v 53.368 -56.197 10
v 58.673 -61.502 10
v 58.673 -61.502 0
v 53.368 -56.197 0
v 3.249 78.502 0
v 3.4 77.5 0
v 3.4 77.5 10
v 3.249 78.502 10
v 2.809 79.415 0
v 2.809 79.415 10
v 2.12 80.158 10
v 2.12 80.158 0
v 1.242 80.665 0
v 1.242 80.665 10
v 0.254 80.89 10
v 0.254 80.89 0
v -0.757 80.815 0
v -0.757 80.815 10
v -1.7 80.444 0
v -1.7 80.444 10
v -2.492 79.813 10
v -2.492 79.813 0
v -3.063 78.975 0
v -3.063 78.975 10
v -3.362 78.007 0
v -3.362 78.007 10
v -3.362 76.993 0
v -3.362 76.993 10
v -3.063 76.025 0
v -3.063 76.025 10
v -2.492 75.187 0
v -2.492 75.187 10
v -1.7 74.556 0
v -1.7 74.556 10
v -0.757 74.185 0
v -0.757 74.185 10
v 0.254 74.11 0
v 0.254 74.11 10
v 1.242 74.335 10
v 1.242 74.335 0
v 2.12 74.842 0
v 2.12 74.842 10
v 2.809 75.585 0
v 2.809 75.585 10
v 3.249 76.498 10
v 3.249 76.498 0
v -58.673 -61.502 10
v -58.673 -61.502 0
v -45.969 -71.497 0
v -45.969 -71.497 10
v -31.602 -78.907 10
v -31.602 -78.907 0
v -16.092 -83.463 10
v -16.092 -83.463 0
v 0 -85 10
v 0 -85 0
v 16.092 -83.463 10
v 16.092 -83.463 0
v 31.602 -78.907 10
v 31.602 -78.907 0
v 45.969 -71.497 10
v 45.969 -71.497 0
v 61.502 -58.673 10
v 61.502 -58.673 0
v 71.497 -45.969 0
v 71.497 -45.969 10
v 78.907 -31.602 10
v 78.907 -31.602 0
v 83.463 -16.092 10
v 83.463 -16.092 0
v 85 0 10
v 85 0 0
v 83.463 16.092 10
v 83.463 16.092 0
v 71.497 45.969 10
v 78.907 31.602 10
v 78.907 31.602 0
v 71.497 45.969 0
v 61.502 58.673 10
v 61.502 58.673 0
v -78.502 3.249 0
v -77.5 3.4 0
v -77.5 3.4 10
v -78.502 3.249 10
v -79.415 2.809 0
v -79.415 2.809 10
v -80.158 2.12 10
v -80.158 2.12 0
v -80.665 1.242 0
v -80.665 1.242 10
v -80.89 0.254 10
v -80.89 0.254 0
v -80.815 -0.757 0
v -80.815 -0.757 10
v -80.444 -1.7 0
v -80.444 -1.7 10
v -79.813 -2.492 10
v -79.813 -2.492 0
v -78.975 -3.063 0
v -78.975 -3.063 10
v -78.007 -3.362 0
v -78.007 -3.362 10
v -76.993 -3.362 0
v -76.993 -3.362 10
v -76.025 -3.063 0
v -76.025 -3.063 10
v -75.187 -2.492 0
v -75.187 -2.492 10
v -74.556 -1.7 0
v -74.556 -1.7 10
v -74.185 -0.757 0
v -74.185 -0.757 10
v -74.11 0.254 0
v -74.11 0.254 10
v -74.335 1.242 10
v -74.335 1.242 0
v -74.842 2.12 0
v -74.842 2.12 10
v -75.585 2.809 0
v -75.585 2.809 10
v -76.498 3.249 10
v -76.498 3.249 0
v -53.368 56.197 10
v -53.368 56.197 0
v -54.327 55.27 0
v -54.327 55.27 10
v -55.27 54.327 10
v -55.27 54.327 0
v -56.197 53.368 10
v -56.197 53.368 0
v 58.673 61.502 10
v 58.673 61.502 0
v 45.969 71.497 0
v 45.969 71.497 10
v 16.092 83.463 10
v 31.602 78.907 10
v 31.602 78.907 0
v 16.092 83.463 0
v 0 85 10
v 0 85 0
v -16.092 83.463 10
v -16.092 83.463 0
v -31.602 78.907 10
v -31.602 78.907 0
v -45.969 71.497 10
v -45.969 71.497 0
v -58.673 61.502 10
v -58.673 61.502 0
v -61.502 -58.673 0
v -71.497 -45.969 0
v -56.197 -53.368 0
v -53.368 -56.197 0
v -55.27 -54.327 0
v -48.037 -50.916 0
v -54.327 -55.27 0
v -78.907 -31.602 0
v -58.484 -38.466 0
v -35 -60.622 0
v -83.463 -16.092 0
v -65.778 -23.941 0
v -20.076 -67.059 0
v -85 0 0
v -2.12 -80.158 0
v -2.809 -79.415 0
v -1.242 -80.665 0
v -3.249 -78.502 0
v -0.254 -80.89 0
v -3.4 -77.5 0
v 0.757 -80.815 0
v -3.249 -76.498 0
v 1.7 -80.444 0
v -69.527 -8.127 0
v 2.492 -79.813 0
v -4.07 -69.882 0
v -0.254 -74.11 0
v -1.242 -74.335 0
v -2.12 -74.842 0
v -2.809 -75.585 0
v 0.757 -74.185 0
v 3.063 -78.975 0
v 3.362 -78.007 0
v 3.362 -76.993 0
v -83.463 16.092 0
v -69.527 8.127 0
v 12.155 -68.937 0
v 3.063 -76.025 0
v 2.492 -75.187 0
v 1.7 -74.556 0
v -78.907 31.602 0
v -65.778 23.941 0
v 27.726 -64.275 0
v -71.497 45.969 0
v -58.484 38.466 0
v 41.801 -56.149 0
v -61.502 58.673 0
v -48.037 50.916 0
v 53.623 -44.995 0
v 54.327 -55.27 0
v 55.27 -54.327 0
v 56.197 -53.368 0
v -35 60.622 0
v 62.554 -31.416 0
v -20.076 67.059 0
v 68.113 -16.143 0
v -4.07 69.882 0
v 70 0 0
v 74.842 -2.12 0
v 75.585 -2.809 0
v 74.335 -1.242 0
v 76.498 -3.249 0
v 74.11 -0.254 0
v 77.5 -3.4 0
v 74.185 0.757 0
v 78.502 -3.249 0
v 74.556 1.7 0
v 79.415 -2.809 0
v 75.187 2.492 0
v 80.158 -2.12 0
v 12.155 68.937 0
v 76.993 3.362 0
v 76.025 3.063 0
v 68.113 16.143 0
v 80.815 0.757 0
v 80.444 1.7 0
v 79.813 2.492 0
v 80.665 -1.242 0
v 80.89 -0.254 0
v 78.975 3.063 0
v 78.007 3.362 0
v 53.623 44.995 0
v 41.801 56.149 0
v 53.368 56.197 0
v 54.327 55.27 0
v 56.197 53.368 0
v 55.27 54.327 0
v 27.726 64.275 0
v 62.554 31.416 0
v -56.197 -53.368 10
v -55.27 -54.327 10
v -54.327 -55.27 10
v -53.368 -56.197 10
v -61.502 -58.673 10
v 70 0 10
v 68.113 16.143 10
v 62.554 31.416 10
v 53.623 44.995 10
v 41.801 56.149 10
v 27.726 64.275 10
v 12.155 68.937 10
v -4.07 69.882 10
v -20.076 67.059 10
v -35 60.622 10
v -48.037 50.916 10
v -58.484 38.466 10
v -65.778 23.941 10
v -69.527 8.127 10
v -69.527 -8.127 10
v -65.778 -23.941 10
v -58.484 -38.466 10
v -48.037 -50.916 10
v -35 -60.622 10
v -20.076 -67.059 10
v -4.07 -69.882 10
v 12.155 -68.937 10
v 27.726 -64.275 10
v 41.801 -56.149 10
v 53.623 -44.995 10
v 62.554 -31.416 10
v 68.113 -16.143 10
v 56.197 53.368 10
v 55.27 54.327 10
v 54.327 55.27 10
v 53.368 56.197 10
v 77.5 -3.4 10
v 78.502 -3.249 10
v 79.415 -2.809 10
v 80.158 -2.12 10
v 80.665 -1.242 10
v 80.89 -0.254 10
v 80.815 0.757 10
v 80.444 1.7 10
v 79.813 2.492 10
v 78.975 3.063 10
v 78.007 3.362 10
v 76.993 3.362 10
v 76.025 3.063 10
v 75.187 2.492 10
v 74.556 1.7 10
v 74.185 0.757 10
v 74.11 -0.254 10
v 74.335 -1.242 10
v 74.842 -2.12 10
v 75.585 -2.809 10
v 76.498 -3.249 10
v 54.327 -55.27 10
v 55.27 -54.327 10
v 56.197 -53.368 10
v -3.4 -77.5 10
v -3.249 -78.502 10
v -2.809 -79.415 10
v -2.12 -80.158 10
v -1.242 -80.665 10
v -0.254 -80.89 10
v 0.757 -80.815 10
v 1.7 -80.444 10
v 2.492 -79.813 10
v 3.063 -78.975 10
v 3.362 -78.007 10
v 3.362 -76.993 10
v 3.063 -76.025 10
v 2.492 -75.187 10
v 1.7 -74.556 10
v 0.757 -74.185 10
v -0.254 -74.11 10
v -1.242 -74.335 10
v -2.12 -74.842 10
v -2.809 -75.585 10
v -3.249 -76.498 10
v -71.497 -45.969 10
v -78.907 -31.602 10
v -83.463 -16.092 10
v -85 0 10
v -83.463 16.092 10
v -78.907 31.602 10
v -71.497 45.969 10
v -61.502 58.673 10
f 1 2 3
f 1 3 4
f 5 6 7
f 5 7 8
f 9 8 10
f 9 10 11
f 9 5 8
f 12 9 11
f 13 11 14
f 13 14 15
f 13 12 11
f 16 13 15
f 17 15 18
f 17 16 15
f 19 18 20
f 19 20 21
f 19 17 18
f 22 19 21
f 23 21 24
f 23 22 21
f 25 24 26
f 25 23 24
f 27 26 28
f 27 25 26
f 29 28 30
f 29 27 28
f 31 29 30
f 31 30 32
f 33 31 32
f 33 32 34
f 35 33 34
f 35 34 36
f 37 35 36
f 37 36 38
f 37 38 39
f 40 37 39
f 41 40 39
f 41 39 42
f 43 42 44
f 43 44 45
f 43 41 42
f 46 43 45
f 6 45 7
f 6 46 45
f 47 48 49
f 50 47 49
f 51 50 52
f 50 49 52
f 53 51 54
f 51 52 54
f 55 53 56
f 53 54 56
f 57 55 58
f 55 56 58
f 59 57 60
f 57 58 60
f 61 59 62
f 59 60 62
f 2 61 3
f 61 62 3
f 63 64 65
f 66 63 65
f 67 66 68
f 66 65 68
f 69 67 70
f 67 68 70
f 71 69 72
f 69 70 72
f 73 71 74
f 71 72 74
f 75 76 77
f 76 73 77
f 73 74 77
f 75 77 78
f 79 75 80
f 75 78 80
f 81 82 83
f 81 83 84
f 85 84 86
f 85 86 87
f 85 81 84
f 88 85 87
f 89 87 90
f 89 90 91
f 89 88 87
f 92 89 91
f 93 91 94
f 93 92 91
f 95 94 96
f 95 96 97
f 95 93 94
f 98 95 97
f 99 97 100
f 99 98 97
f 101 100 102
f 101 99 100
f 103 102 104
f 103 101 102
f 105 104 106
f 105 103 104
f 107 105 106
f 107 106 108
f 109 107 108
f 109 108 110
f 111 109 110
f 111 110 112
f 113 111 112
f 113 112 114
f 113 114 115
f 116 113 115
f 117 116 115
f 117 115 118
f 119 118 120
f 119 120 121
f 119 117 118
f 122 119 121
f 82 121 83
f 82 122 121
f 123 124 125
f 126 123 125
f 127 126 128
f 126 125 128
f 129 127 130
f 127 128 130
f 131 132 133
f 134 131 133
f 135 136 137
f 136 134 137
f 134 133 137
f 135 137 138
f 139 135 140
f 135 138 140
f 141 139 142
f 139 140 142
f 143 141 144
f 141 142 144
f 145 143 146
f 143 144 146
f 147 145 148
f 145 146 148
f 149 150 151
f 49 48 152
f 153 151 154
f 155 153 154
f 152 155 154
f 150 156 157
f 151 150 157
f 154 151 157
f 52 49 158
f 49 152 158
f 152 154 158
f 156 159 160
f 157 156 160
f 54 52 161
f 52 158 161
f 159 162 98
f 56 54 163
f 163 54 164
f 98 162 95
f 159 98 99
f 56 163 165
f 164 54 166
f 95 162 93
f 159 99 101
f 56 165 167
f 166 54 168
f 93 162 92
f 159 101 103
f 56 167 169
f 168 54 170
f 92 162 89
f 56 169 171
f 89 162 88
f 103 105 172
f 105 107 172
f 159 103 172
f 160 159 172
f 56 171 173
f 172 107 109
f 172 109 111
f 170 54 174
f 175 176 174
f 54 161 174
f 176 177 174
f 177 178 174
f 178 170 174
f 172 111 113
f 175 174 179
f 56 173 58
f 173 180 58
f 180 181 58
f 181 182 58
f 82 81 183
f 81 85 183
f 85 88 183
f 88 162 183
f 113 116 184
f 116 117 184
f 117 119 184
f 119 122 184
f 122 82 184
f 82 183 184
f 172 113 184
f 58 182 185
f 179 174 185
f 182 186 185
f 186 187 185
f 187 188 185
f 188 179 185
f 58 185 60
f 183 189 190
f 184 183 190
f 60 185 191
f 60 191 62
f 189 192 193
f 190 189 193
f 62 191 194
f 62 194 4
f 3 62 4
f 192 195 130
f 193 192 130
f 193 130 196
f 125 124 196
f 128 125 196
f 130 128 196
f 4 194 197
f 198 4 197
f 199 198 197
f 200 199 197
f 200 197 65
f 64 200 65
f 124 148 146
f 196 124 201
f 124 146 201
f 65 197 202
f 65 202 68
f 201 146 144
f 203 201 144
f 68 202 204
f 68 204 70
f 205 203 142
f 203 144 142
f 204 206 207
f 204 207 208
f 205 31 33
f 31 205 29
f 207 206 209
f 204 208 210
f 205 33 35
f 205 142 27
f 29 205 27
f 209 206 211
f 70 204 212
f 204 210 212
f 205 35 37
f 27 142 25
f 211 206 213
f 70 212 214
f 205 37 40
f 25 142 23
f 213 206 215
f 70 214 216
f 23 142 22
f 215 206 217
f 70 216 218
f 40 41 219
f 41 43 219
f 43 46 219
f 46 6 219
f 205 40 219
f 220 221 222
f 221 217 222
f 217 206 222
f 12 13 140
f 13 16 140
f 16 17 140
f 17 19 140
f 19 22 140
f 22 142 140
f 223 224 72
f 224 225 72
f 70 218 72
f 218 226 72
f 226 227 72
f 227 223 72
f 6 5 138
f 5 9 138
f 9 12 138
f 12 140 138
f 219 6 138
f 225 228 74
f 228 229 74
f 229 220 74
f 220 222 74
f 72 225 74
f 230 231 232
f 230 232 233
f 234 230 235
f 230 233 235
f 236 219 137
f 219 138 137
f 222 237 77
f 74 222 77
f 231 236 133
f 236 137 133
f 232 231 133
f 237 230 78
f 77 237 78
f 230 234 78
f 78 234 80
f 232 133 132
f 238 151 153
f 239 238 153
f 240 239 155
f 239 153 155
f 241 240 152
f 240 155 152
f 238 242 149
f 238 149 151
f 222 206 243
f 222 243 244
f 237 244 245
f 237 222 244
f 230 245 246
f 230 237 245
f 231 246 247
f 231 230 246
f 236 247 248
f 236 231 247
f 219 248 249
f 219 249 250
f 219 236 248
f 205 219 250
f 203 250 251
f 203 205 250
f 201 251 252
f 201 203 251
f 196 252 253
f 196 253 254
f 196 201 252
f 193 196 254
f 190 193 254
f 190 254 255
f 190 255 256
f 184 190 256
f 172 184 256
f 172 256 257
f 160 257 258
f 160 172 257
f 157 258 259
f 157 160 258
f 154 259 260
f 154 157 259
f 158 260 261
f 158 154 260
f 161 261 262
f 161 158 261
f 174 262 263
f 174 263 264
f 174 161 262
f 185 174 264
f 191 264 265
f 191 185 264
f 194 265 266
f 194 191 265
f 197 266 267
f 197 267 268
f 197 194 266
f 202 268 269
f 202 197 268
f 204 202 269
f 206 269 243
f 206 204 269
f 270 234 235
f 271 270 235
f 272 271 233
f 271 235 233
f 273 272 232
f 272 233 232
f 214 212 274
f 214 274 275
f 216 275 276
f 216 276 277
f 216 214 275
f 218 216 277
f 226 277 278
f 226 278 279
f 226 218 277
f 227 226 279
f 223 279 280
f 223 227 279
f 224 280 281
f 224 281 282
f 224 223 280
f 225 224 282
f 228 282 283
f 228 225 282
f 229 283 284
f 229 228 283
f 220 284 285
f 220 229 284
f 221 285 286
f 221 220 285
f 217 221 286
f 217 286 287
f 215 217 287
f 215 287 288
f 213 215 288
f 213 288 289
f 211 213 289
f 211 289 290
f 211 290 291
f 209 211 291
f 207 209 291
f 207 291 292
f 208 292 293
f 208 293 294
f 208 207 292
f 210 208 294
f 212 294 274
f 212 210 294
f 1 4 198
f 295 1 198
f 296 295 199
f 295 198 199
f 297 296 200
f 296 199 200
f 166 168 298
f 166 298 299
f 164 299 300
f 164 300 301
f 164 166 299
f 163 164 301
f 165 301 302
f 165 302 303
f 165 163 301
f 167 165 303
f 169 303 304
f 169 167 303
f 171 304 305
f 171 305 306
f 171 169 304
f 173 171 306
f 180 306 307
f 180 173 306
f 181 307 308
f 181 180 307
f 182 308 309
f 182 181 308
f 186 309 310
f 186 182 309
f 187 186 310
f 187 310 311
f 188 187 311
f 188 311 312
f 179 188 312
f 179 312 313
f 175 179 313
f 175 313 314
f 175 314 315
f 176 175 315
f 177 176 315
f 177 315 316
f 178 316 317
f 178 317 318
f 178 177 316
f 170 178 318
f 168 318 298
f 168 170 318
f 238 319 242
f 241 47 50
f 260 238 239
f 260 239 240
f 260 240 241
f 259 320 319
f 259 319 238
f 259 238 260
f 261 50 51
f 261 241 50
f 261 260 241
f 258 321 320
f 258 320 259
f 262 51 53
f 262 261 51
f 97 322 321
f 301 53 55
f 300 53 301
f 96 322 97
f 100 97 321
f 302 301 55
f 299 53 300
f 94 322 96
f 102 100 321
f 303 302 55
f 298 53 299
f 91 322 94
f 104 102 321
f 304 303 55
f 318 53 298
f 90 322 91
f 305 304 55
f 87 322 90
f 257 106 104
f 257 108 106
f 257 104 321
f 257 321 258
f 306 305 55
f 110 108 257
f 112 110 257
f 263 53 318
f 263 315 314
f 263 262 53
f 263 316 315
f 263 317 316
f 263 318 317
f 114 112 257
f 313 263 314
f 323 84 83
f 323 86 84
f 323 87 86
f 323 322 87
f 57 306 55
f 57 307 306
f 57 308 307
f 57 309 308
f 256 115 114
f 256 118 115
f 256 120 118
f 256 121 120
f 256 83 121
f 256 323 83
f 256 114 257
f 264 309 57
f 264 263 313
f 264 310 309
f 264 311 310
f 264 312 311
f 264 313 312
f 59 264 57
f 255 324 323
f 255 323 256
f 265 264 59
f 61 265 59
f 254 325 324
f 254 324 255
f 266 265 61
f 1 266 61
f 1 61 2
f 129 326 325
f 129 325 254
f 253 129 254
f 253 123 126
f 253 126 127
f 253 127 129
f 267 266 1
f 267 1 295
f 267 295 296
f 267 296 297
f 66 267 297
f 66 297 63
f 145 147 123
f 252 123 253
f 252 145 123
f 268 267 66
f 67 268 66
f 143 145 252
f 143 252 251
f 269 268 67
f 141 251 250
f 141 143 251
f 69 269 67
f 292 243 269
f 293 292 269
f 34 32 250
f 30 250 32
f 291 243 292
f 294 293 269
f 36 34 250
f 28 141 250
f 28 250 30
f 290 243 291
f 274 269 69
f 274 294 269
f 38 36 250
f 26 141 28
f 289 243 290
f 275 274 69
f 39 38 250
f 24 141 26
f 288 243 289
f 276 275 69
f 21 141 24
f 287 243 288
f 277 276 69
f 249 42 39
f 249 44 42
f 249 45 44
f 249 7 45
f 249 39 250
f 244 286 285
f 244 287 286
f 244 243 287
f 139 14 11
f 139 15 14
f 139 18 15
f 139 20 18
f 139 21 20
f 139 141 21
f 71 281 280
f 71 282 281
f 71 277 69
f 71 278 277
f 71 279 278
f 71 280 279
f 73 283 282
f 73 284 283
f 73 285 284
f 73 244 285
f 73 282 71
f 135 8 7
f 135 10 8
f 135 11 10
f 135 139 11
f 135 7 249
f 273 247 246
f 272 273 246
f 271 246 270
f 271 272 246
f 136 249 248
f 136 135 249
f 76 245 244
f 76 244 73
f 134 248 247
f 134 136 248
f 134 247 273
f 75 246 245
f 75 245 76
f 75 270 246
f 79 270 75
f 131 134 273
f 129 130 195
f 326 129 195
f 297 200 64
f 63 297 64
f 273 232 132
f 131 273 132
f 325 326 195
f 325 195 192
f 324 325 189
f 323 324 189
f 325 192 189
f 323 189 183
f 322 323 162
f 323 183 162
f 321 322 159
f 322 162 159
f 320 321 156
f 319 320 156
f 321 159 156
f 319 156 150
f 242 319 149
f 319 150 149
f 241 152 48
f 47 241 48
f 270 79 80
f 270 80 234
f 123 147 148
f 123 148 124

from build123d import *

# Parameters (mm, degrees)
SZKIC1_R                    = 85
SZKIC1_R_2                  = 70
DODANIE_WYCI_GNI_CIE1_DEPTH = 10
WYTNIJ_WYCI_GNI_CIE1_START  = -10
SZKIC2_R                    = 3.4
WYTNIJ_WYCI_GNI_CIE1_DEPTH  = 10
SZYK_KO_OWY1_COUNT          = 4


with BuildPart() as part:
    # Szkic1 → Dodanie-wyciągnięcie1 (new body)
    with BuildSketch(Plane.XY):
        Circle(SZKIC1_R)
        Circle(SZKIC1_R_2, mode=Mode.SUBTRACT)
    extrude(amount=DODANIE_WYCI_GNI_CIE1_DEPTH)

    # Szkic2 → Wytnij-wyciągnięcie1 (cut)
    with BuildSketch(Plane.XY.offset(10).offset(WYTNIJ_WYCI_GNI_CIE1_START)):
        with Locations((0, 77.5)):
            Circle(SZKIC2_R)
        with BuildLine():
            Line((-56.196738148, 53.368311023), (-61.501649853, 58.673222728))
            ThreePointArc((-61.501649853, 58.673222728), (-60.104076401, 60.104076401), (-58.673222728, 61.501649853))
            Line((-58.673222728, 61.501649853), (-53.368311023, 56.196738148))
            ThreePointArc((-53.368311023, 56.196738148), (-54.800775542, 54.800775542), (-56.196738148, 53.368311023))
        make_face()
    wytnij_wyci_gni_cie1 = extrude(amount=WYTNIJ_WYCI_GNI_CIE1_DEPTH, mode=Mode.SUBTRACT)

    # Szyk kołowy1: Wytnij-wyciągnięcie1 ×4 about axis
    szyk_ko_owy1_axis = Axis((0, 0, 0), (0, 0, 1))
    for i in range(1, SZYK_KO_OWY1_COUNT):
        add(wytnij_wyci_gni_cie1.rotate(szyk_ko_owy1_axis, i * 360 / SZYK_KO_OWY1_COUNT), mode=Mode.SUBTRACT)


solid = part.part
